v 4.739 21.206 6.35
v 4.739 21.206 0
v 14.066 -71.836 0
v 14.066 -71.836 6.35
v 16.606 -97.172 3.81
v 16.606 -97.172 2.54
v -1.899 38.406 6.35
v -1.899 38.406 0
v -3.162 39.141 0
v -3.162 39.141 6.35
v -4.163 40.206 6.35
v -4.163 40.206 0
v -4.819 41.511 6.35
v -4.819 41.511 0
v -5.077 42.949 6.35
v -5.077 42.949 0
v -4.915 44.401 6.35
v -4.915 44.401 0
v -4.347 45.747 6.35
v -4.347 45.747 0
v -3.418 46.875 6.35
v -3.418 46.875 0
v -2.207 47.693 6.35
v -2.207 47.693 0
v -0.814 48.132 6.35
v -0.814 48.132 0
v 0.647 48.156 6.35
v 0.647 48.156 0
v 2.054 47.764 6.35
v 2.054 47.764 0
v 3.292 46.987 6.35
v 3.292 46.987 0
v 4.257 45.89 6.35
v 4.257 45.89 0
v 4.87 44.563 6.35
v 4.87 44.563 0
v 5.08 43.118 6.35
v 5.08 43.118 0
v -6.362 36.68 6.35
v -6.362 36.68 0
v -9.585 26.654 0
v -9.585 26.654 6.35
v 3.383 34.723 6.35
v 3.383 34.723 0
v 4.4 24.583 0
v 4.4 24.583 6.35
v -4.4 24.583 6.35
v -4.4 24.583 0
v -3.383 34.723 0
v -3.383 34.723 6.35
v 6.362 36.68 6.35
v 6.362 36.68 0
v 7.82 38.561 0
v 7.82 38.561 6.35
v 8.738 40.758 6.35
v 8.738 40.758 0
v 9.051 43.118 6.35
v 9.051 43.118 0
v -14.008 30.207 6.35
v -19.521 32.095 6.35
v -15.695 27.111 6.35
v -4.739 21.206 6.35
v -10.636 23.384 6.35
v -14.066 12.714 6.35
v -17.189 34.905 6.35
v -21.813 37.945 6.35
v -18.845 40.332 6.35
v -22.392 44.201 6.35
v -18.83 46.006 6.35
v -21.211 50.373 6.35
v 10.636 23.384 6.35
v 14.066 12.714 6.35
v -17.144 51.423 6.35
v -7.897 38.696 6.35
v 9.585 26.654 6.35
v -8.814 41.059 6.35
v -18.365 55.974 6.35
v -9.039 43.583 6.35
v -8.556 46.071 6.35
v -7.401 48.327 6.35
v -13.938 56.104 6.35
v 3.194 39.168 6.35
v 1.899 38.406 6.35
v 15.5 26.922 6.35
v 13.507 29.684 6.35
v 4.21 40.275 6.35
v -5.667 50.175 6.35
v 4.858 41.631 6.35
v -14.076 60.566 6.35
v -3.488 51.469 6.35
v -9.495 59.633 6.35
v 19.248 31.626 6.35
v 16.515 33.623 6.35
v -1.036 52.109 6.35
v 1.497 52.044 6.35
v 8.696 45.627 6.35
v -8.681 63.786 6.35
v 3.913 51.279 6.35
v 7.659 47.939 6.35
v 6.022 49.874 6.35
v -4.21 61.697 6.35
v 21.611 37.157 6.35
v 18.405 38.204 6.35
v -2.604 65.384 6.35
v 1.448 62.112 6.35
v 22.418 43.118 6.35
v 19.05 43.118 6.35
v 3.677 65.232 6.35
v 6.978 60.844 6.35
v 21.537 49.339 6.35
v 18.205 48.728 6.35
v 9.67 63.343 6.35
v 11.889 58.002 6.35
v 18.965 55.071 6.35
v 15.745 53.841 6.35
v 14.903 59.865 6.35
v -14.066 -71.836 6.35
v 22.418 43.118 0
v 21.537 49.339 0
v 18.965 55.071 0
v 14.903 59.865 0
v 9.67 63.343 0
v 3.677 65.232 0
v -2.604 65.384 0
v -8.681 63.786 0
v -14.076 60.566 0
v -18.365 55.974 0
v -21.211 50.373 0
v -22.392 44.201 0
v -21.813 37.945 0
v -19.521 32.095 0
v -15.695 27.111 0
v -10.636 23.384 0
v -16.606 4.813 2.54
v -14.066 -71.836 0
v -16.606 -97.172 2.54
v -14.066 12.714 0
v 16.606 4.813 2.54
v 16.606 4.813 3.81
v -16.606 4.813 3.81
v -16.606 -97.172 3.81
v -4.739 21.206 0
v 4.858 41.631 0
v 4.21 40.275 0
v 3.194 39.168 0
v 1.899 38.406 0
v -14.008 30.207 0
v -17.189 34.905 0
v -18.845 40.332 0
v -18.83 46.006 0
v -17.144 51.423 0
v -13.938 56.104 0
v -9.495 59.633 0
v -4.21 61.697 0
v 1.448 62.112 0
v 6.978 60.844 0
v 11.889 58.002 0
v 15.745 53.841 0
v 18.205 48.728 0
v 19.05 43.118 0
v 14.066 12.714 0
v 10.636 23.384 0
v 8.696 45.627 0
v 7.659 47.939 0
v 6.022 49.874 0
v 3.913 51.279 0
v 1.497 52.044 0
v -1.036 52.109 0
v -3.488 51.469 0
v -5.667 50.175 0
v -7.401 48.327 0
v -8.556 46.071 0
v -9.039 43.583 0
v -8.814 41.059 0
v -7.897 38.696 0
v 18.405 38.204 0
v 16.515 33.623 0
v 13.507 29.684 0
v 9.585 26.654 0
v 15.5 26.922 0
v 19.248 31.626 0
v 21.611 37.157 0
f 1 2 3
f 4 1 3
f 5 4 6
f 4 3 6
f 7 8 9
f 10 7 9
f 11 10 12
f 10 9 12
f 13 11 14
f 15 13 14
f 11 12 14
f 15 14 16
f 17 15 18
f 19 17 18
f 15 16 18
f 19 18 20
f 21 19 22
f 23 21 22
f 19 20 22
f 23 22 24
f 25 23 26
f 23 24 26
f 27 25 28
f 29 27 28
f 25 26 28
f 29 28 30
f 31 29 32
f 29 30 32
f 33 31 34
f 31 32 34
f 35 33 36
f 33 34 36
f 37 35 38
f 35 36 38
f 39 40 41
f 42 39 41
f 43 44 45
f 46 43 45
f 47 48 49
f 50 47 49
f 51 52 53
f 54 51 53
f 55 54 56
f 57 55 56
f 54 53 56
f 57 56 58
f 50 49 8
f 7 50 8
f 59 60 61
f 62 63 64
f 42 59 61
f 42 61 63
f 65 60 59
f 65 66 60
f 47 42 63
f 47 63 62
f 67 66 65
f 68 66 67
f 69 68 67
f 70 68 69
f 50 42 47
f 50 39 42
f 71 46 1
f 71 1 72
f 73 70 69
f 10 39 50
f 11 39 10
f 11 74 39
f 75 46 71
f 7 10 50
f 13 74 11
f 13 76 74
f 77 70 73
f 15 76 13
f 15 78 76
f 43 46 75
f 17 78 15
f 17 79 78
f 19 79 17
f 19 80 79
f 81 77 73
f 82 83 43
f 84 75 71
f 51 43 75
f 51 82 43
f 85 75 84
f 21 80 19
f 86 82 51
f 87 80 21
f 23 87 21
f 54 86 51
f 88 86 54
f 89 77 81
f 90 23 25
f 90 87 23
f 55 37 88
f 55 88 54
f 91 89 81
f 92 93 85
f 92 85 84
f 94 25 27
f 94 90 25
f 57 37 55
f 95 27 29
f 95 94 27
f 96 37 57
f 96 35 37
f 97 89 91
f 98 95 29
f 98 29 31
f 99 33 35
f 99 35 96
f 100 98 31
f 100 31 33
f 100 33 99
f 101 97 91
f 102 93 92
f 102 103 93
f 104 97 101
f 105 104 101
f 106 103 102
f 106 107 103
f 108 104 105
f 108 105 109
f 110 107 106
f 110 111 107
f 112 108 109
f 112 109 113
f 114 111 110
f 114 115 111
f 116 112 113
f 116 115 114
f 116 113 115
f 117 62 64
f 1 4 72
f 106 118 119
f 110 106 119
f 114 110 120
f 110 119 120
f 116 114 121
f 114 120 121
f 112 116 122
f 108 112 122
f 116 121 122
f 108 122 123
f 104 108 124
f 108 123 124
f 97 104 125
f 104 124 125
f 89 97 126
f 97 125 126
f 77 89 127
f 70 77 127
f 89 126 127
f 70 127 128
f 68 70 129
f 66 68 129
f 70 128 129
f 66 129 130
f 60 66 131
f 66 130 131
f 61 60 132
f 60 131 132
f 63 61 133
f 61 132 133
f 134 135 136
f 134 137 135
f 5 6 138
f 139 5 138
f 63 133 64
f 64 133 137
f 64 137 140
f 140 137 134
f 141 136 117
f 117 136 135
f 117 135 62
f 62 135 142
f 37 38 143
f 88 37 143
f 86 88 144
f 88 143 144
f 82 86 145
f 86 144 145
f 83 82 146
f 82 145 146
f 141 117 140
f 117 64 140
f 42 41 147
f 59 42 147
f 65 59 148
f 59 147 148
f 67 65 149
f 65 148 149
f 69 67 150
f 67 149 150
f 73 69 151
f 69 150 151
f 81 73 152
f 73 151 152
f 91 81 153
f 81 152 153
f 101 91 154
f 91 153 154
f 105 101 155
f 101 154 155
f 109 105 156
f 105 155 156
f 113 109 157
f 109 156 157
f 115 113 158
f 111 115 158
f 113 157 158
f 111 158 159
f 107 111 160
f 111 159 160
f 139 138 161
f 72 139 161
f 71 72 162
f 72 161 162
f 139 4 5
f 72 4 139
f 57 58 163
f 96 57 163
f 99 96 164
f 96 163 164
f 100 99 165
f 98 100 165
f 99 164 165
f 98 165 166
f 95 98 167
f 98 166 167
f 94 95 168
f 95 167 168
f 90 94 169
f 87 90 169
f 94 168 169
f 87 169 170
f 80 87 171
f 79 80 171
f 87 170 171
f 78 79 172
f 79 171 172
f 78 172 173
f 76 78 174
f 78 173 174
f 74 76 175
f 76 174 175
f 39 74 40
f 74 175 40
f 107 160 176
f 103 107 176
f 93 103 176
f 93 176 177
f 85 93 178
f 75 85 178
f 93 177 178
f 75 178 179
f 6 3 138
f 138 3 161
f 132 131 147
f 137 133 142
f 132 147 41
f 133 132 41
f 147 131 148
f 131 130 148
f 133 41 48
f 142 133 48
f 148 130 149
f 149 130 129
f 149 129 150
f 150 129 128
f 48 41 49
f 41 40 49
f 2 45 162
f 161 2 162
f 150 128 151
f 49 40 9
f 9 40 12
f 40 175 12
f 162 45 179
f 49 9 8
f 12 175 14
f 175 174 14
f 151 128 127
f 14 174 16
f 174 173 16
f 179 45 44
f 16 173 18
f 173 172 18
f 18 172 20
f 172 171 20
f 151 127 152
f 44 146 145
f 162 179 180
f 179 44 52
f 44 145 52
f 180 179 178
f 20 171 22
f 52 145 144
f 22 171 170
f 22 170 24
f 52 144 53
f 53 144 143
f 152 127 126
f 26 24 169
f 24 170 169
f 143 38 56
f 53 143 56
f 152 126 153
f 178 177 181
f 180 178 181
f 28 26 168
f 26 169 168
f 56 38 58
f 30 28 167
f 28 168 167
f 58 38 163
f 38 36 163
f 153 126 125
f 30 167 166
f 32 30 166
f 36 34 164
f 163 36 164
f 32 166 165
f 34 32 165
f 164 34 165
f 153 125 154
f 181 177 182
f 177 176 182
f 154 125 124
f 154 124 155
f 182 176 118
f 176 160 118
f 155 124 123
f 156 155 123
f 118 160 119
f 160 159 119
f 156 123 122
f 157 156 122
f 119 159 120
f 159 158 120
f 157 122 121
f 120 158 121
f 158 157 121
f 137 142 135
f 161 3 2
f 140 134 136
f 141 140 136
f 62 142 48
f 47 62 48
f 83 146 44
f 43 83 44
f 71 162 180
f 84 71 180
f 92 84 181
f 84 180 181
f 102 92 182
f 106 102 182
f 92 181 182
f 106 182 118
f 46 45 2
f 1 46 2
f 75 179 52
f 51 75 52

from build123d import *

# Parameters (mm, degrees)
F1_DEPTH = 6.35
F2_SIZE  = 2.54


with BuildPart() as f1:
    # F0 (on Top) → F1 (new body)
    with BuildSketch(Plane.XY):
        with BuildLine():
            ThreePointArc((-4.7385636703, 21.2063813699), (-7.7641105007, 22.0872871715), (-10.6362471428, 23.3837283631))
            Line((-10.6362471428, 23.3837283631), (-16.6063122451, 4.8134931872))
            Line((-16.6063122451, 4.8134931872), (-16.6063122451, -97.1717238426))
            Line((-16.6063122451, -97.1717238426), (-4.7385636703, 21.2063813699))
        make_face()
        with BuildLine():
            Line((16.6063122451, 4.8134931872), (10.6362471428, 23.3837283631))
            ThreePointArc((10.6362471428, 23.3837283631), (7.7641105007, 22.0872871715), (4.7385636703, 21.2063813699))
            Line((4.7385636703, 21.2063813699), (16.6063122451, -97.1717238426))
            Line((16.6063122451, -97.1717238426), (16.6063122451, 4.8134931872))
        make_face()
        with BuildLine():
            ThreePointArc((4.7385636703, 21.2063813699), (7.7641105007, 22.0872871715), (10.6362471428, 23.3837283631))
            Line((10.6362471428, 23.3837283631), (9.584756598, 26.6544509379))
            ThreePointArc((9.584756598, 26.6544509379), (7.0687284773, 25.427604555), (4.4000770701, 24.5827085745))
            Line((4.4000770701, 24.5827085745), (4.7385636703, 21.2063813699))
        make_face()
        with BuildLine():
            ThreePointArc((4.4000770701, 24.5827085745), (7.0687284773, 25.427604555), (9.584756598, 26.6544509379))
            Line((9.584756598, 26.6544509379), (6.36176439, 36.6797558963))
            ThreePointArc((6.36176439, 36.6797558963), (4.9698835047, 35.5533311125), (3.3834871789, 34.7229625859))
            Line((3.3834871789, 34.7229625859), (4.4000770701, 24.5827085745))
        make_face()
        with BuildLine():
            Line((-9.584756598, 26.6544509379), (-10.6362471428, 23.3837283631))
            ThreePointArc((-10.6362471428, 23.3837283631), (-7.7641105007, 22.0872871715), (-4.7385636703, 21.2063813699))
            Line((-4.7385636703, 21.2063813699), (-4.4000770701, 24.5827085745))
            ThreePointArc((-4.4000770701, 24.5827085745), (-7.0687284773, 25.427604555), (-9.584756598, 26.6544509379))
        make_face()
        with BuildLine():
            Line((-6.36176439, 36.6797558963), (-9.584756598, 26.6544509379))
            ThreePointArc((-9.584756598, 26.6544509379), (-7.0687284773, 25.427604555), (-4.4000770701, 24.5827085745))
            Line((-4.4000770701, 24.5827085745), (-3.3834871789, 34.7229625859))
            ThreePointArc((-3.3834871789, 34.7229625859), (-4.9698835047, 35.5533311125), (-6.36176439, 36.6797558963))
        make_face()
        with BuildLine():
            ThreePointArc((10.6362471428, 23.3837283631), (19.2483201468, 31.6259749482), (22.417739409, 43.1175897928))
            ThreePointArc((22.417739409, 43.1175897928), (-11.4916148446, 62.3659099396), (-10.6362471428, 23.3837283631))
            Line((-10.6362471428, 23.3837283631), (-9.584756598, 26.6544509379))
            ThreePointArc((-9.584756598, 26.6544509379), (-9.4950746919, 59.6326149698), (19.05, 43.1175897928))
            ThreePointArc((19.05, 43.1175897928), (16.515025177, 33.622515101), (9.584756598, 26.6544509379))
            Line((9.584756598, 26.6544509379), (10.6362471428, 23.3837283631))
        make_face()
        with BuildLine():
            ThreePointArc((9.0508425814, 43.1175897928), (-3.4884397228, 51.4691489127), (-6.36176439, 36.6797558963))
            ThreePointArc((-6.36176439, 36.6797558963), (-4.9698835047, 35.5533311125), (-3.3834871789, 34.7229625859))
            Line((-3.3834871789, 34.7229625859), (-1.8990624038, 38.405906231))
            ThreePointArc((-1.8990624038, 38.405906231), (-2.8424604649, 47.3279126433), (5.08, 43.1175897928))
            ThreePointArc((5.08, 43.1175897928), (4.2103228505, 40.2751293279), (1.8990624038, 38.405906231))
            Line((1.8990624038, 38.405906231), (3.3834871789, 34.7229625859))
            ThreePointArc((3.3834871789, 34.7229625859), (4.9698835047, 35.5533311125), (6.36176439, 36.6797558963))
            ThreePointArc((6.36176439, 36.6797558963), (8.3515591199, 39.62915007), (9.0508425814, 43.1175897928))
        make_face()
    extrude(amount=F1_DEPTH)

    # F2
    f2_edges = [f1.edges().sort_by_distance(p)[0] for p in [
        (-16.606312, -46.179115, 6.35),
        (16.606312, -46.179115, 6.35),
        (16.606312, -46.179115, 0),
        (-16.606312, -46.179115, 0),
    ]]
    chamfer(f2_edges, length=F2_SIZE)


solid = f1.part
